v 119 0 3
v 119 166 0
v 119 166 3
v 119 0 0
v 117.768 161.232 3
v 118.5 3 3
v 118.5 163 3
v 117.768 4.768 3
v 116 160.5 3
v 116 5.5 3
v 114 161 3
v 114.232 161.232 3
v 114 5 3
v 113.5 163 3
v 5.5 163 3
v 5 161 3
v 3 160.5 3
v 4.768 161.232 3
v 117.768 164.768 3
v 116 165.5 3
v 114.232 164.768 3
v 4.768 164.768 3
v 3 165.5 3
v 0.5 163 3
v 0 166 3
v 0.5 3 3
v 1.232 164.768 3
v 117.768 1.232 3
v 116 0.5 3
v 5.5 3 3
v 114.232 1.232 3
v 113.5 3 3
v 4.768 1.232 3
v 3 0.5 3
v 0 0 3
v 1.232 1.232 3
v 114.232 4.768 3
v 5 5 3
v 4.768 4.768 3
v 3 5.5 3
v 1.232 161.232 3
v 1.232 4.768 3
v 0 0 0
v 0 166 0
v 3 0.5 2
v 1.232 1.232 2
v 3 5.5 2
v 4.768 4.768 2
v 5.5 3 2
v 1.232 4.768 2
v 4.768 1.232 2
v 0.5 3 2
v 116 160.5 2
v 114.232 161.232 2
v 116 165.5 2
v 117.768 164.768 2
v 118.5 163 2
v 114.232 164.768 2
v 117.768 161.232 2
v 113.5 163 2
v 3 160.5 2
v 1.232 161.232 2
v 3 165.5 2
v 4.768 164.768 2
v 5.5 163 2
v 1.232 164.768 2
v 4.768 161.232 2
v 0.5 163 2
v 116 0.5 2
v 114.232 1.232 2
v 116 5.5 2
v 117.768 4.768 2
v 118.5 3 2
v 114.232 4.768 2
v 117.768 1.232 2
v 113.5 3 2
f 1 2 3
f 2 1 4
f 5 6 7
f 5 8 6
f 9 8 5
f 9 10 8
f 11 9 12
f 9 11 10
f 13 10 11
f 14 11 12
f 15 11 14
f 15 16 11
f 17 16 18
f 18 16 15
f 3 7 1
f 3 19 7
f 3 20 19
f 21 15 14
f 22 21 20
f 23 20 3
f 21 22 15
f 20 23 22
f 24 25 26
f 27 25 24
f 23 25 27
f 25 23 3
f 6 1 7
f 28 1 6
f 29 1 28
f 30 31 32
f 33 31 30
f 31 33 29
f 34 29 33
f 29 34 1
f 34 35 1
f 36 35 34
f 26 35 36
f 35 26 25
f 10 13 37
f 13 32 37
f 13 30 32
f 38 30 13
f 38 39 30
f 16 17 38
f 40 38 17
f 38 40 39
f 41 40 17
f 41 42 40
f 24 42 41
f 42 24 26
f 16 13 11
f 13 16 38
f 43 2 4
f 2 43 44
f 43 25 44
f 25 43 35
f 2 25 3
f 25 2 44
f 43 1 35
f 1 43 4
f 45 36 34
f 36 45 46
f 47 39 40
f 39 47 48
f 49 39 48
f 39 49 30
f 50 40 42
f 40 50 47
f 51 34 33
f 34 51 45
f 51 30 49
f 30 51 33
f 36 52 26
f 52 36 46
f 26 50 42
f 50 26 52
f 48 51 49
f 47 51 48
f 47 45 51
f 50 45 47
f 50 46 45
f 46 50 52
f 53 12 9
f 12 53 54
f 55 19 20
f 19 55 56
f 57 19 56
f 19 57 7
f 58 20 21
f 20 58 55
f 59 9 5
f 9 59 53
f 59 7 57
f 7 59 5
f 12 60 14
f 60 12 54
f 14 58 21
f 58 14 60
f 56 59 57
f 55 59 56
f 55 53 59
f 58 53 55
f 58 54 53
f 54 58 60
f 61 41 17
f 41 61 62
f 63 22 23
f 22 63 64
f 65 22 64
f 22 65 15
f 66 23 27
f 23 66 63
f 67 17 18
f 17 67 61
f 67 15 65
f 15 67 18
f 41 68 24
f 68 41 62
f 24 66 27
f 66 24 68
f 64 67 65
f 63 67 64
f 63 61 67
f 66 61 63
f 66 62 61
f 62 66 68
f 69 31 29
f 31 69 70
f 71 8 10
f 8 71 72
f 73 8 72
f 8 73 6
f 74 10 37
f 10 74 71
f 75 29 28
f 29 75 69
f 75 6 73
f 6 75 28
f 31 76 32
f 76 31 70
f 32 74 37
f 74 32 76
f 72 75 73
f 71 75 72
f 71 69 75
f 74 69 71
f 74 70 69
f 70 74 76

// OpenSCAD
//$fn=360;
//67x93x22
x=109;
y=156;
z=1;
//square([x+4,y+4]);
difference() {
    translate([0,0,0])
    cube([x+10,y+10,z+2]);
    translate([5,5,3])
    cube([x,y,z]);
    //translate([5,0,15])
    //cube([x-8,y,z-20]);
    translate([3,3,z+1])
    cylinder(h=1,d=5);
    translate([x+7,y+7,z+1])
    cylinder(h=1,d=5);
    translate([3,y+7,z+1])
    cylinder(h=1,d=5);
    translate([x+7,3,z+1])
    cylinder(h=1,d=5);
}
